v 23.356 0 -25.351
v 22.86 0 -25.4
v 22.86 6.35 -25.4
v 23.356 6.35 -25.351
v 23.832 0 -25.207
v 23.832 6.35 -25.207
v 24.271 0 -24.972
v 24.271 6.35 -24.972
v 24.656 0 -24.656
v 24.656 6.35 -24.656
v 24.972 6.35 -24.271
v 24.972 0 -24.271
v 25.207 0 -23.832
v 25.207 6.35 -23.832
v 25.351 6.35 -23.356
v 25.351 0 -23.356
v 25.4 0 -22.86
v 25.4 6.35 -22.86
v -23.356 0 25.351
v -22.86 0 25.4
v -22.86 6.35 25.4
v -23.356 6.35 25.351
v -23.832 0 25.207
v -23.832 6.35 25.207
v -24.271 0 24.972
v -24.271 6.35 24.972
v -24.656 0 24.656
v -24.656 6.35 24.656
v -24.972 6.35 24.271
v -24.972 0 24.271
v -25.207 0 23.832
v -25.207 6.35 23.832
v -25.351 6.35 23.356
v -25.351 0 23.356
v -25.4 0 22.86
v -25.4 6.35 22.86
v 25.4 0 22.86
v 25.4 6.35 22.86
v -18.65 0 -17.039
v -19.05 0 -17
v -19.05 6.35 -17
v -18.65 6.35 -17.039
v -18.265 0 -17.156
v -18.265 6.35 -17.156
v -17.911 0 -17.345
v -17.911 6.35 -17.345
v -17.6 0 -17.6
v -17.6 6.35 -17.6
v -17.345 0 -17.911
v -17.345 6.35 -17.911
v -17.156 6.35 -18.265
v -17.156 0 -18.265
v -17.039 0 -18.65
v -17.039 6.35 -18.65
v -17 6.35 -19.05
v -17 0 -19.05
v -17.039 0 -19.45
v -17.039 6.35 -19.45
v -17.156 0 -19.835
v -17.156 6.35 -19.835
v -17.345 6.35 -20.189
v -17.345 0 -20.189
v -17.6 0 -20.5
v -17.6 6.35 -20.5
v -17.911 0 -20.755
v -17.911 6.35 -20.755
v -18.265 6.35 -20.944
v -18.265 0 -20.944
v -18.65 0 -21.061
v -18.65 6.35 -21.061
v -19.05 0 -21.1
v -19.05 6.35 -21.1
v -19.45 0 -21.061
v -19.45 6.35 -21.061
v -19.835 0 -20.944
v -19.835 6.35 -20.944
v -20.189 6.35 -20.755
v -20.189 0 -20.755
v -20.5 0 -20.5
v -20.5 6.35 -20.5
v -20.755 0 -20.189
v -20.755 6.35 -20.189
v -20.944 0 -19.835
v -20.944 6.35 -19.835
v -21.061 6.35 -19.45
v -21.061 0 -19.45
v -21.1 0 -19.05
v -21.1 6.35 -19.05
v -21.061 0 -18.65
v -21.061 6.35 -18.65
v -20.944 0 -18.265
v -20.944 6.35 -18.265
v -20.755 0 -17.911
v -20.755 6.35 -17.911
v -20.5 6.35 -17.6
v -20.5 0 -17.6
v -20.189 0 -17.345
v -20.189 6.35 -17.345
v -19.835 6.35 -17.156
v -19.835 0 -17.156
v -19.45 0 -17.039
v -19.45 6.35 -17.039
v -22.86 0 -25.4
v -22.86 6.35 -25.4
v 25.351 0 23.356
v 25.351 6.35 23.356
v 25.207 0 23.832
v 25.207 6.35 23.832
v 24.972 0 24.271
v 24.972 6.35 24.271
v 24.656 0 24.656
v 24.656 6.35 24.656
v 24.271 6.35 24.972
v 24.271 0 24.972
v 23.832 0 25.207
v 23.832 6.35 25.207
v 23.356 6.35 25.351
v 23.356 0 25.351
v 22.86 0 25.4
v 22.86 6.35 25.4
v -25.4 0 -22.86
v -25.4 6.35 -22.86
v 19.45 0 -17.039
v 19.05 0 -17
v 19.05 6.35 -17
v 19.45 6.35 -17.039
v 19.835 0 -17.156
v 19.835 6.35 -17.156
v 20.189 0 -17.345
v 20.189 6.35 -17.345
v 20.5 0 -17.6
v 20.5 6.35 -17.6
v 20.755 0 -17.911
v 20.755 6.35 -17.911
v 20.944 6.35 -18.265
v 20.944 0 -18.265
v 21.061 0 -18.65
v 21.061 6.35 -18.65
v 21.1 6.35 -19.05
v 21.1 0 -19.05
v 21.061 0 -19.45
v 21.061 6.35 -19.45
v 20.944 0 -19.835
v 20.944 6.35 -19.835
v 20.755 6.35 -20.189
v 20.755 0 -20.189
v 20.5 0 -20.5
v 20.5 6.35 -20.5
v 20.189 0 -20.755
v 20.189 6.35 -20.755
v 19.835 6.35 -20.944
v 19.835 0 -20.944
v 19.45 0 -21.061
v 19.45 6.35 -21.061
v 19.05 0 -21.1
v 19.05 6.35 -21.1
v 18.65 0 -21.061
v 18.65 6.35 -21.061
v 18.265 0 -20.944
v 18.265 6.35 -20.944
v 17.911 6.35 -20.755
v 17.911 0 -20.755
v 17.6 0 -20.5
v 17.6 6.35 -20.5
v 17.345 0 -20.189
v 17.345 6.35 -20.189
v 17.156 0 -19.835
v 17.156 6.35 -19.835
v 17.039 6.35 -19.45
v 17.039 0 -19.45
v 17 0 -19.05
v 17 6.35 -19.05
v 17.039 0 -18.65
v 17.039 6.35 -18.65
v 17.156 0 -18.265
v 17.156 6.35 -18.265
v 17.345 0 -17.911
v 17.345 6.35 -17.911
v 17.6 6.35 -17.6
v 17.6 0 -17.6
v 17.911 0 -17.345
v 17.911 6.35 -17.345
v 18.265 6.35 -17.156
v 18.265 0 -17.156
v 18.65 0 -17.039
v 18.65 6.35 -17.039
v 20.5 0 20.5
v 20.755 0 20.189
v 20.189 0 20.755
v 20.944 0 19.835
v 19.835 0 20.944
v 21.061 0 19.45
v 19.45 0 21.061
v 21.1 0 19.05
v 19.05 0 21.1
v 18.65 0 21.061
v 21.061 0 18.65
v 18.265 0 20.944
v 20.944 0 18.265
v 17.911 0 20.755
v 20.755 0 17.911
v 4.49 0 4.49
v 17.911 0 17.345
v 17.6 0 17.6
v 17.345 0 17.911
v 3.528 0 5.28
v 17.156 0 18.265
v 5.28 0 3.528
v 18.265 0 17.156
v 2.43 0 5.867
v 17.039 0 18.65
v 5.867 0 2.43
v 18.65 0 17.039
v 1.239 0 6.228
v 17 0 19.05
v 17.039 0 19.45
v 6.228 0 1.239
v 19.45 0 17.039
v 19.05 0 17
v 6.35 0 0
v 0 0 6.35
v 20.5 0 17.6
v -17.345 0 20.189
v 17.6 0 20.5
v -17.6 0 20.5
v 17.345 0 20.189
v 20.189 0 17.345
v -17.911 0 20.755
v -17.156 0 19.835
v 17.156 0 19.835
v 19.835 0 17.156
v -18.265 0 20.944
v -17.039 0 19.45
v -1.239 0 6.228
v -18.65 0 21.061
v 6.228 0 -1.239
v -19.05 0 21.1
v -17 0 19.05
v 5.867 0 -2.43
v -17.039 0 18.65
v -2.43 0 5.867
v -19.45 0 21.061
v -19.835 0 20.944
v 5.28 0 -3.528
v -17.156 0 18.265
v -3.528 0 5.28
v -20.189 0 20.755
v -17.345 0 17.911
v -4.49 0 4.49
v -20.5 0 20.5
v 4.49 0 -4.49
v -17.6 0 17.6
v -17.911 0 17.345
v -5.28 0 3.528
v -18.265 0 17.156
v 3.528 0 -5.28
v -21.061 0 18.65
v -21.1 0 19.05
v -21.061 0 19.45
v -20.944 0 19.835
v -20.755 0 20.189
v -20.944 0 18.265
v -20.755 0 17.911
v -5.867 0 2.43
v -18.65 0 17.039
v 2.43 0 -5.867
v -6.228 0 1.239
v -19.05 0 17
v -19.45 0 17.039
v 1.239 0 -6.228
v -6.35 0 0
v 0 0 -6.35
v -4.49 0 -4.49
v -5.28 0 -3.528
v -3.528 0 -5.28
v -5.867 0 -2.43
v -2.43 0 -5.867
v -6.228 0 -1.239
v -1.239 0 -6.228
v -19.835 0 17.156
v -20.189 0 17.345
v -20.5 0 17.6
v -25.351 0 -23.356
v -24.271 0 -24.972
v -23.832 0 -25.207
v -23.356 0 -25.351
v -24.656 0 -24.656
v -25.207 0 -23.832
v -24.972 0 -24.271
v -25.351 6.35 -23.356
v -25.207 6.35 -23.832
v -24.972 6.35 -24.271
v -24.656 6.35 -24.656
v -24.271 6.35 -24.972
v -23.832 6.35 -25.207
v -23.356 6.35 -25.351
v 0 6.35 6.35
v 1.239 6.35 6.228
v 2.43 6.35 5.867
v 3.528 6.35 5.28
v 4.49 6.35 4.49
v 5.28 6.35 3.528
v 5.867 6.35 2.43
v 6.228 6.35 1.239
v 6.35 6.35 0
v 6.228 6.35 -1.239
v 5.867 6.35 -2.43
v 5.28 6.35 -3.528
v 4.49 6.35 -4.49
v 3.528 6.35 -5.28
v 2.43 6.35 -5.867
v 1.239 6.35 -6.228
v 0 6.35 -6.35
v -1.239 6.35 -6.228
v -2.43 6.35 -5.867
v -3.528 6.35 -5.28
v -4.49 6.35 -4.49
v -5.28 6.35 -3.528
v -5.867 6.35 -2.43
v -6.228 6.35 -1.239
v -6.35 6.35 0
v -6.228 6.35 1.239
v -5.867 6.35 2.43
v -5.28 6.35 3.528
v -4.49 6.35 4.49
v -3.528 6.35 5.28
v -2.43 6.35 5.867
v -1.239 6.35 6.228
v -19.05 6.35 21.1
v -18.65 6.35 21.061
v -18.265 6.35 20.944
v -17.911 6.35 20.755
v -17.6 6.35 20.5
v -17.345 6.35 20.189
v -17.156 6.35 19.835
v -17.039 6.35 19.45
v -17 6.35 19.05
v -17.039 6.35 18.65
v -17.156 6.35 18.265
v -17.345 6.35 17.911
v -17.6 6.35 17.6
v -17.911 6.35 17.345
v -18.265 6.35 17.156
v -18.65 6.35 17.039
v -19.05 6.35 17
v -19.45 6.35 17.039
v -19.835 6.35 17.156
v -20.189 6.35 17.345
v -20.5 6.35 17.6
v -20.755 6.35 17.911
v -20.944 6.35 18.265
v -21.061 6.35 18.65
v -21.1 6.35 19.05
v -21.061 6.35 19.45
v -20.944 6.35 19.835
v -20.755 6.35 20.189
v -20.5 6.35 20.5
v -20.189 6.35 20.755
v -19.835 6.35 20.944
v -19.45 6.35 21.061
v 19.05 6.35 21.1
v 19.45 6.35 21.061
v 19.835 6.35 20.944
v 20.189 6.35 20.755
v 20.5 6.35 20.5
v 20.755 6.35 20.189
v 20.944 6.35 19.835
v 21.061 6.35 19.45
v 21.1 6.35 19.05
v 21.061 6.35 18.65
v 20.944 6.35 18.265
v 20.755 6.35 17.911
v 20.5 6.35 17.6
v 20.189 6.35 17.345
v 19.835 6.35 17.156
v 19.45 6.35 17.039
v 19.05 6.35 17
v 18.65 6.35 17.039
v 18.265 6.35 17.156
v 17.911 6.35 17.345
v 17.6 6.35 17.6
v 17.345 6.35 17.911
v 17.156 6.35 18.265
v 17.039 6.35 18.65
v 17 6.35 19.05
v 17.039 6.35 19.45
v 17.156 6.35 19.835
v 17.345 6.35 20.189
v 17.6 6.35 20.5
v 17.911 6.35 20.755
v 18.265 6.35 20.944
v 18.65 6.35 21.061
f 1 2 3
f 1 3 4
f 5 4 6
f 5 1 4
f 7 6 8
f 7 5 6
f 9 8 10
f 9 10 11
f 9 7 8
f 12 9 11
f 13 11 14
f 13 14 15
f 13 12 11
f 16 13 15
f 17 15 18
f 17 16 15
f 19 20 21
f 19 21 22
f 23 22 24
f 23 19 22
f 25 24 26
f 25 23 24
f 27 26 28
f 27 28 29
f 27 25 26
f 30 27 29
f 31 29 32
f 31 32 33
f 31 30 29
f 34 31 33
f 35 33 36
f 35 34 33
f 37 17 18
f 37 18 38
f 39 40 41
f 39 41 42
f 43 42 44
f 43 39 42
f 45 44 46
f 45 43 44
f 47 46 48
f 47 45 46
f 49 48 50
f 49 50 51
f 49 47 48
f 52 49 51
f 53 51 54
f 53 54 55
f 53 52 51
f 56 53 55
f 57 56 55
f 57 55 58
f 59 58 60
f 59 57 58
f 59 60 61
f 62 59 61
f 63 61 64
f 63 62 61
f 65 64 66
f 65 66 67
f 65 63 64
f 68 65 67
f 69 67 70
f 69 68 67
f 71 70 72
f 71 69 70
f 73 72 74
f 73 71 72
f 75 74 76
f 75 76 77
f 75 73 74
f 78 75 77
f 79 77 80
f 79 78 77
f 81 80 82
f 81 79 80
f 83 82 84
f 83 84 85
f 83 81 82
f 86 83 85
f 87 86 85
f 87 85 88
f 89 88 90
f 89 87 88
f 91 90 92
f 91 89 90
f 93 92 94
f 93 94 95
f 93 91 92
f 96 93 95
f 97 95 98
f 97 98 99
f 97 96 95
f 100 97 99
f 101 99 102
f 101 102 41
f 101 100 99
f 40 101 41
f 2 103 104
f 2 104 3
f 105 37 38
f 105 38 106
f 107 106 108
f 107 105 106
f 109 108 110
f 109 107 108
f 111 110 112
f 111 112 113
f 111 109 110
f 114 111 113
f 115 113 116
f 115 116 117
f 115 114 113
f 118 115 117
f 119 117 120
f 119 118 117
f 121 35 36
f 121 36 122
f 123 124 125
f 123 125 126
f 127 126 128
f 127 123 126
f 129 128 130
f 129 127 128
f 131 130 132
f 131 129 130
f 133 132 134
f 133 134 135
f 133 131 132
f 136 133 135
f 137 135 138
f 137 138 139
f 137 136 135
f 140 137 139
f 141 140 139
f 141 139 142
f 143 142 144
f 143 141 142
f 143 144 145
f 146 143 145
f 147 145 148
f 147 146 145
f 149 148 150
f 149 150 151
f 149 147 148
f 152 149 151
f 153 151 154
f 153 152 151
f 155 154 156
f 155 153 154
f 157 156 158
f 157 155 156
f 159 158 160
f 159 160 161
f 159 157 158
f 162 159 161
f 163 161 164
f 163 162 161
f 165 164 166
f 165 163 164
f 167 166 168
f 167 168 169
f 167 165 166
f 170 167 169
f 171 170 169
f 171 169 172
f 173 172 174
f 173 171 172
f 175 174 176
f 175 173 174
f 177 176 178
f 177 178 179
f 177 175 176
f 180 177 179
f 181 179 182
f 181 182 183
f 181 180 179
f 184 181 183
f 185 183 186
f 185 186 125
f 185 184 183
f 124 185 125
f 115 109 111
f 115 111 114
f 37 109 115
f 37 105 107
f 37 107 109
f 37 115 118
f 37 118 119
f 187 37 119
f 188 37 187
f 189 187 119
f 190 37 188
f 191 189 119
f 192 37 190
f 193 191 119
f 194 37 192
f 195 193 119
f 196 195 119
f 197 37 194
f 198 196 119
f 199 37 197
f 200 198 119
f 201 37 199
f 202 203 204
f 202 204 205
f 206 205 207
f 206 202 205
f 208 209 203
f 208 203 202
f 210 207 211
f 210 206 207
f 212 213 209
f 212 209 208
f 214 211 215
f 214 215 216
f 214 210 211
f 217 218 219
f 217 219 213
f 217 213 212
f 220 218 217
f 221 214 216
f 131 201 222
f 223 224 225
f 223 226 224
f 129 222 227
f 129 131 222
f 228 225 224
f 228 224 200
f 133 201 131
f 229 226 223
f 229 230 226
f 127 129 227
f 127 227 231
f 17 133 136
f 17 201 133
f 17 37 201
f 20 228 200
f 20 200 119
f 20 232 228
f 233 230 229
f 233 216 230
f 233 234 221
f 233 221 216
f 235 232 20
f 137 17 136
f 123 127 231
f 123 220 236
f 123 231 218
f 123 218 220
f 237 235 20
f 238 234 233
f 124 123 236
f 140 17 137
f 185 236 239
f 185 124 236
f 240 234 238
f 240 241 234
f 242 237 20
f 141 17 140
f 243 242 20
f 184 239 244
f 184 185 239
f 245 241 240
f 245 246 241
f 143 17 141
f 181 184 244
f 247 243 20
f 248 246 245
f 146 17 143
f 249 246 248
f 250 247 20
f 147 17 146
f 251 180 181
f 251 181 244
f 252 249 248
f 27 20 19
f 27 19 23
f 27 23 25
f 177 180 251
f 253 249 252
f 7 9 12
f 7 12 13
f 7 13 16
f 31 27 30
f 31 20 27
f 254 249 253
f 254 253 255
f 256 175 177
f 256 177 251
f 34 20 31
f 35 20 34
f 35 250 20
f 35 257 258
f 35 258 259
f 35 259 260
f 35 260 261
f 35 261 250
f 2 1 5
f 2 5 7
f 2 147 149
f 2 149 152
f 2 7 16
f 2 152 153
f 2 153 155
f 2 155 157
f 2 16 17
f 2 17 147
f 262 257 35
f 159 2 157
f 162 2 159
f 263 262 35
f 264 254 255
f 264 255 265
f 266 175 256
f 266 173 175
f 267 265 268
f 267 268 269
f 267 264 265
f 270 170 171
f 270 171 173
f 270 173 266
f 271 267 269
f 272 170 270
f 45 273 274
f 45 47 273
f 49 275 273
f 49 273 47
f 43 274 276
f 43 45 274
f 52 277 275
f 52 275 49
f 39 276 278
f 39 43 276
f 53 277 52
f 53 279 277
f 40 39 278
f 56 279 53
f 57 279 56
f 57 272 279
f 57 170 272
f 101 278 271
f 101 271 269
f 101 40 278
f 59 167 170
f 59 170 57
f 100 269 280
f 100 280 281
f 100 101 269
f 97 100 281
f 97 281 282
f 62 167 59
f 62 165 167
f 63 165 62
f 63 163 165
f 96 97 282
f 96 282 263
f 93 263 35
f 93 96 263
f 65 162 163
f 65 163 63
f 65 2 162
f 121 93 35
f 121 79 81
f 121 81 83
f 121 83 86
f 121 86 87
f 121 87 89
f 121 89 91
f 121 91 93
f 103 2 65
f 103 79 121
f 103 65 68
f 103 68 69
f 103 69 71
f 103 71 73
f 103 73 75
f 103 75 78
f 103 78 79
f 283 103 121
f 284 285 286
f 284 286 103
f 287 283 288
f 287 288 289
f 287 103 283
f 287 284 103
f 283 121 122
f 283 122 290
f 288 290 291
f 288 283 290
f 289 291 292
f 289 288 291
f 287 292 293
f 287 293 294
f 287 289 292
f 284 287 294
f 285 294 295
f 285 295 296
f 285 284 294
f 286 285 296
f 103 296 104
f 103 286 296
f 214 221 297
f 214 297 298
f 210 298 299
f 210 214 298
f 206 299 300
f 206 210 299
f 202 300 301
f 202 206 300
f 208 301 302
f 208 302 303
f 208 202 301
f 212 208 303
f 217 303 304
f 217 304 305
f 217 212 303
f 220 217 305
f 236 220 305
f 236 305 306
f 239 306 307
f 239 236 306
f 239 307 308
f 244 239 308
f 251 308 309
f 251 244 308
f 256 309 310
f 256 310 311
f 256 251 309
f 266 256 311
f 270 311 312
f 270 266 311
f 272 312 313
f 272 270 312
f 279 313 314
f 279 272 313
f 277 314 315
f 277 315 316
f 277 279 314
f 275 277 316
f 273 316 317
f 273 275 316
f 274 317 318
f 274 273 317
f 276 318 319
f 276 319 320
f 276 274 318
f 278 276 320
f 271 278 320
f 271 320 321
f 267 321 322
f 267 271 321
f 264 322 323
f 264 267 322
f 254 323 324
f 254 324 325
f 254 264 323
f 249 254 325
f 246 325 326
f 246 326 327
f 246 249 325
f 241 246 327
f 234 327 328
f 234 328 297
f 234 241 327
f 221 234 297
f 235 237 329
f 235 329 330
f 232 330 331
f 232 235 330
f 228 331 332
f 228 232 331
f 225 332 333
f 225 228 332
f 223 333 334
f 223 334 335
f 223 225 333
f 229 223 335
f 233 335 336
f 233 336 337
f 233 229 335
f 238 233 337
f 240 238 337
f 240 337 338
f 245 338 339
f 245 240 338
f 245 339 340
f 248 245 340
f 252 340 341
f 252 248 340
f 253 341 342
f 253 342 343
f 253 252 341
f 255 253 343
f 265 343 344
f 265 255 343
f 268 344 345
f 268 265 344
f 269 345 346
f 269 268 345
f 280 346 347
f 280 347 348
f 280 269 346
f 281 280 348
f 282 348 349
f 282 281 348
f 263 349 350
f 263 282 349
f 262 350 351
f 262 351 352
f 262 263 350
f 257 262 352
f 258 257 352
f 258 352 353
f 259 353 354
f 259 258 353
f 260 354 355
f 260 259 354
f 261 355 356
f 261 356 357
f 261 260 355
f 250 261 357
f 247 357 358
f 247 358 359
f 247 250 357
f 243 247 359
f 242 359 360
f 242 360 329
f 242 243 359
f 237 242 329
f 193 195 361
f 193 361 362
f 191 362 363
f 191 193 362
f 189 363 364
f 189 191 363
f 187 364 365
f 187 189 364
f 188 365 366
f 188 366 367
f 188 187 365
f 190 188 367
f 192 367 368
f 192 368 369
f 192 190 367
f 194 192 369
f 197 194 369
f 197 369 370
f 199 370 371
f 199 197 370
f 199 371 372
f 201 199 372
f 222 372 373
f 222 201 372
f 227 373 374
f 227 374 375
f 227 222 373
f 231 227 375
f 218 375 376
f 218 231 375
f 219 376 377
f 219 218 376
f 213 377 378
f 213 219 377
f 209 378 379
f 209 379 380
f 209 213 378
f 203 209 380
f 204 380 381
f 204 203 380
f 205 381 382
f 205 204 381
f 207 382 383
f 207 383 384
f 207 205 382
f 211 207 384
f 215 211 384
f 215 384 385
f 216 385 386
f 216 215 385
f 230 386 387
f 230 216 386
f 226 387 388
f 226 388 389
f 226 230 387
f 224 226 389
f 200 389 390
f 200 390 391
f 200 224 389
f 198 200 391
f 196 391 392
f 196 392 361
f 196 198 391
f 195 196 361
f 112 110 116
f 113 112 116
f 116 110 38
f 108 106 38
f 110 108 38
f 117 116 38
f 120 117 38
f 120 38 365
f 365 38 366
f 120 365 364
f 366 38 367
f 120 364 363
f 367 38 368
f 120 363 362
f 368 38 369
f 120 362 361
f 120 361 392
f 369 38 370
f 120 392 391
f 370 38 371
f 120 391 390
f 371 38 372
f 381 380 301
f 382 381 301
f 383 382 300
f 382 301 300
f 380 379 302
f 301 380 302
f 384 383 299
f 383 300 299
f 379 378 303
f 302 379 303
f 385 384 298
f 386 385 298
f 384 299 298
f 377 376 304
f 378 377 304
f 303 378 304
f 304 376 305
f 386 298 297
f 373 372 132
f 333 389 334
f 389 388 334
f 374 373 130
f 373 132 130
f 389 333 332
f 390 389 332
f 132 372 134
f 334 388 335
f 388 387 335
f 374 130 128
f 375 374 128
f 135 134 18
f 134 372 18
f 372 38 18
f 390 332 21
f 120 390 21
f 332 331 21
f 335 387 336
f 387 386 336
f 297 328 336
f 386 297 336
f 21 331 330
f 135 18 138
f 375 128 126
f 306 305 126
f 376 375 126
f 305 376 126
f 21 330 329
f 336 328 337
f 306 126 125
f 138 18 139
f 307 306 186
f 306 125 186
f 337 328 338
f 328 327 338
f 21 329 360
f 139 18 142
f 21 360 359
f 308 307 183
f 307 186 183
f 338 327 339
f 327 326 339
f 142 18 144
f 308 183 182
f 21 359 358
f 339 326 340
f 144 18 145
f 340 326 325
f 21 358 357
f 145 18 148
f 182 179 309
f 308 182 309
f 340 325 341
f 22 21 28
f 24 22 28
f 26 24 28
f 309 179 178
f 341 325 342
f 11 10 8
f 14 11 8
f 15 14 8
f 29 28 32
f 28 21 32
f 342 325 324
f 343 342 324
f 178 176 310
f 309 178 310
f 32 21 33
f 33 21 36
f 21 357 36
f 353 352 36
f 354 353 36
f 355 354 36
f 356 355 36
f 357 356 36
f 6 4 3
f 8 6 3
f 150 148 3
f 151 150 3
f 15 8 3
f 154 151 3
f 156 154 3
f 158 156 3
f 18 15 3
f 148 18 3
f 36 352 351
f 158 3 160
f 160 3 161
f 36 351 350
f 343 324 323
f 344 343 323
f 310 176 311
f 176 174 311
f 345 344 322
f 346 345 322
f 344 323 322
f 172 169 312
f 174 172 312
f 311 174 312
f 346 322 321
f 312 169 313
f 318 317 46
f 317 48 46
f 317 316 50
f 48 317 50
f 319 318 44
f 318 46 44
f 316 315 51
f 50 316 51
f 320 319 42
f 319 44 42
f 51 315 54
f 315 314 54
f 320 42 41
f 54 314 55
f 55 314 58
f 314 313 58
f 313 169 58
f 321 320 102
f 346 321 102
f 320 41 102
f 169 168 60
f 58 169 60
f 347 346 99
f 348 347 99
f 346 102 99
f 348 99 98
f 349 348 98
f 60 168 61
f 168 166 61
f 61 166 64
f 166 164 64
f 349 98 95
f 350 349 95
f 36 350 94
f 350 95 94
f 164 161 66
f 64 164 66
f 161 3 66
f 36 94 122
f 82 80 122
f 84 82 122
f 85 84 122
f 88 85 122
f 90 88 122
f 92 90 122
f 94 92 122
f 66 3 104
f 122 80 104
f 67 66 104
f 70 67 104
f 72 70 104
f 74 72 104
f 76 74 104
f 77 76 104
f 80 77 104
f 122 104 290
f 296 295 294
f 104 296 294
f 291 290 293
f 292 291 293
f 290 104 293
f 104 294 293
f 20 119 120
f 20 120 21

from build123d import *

# Parameters (mm, degrees)
SKETCH2_R           = 2.05
SKETCH2_R_2         = 6.35
BOSS_EXTRUDE1_DEPTH = 6.35


with BuildPart() as part:
    # Sketch2 → Boss-Extrude1 (new body)
    with BuildSketch(Plane(origin=(0, 0, 0), x_dir=(1, 0, 0), z_dir=(0, 1, 0))):
        with BuildLine():
            ThreePointArc((-25.4, 22.86), (-24.656051224, 24.656051224), (-22.86, 25.4))
            Line((-22.86, 25.4), (22.86, 25.4))
            ThreePointArc((22.86, 25.4), (24.656051224, 24.656051224), (25.4, 22.86))
            Line((25.4, 22.86), (25.4, -22.86))
            ThreePointArc((25.4, -22.86), (24.656051224, -24.656051224), (22.86, -25.4))
            Line((22.86, -25.4), (-22.86, -25.4))
            ThreePointArc((-22.86, -25.4), (-24.656051224, -24.656051224), (-25.4, -22.86))
            Line((-25.4, -22.86), (-25.4, 22.86))
        make_face()
        with Locations(Location((-19.05, -19.05, 0), (0, 0, 270))):
            Circle(SKETCH2_R, mode=Mode.SUBTRACT)
        with Locations(Location((19.05, -19.05, 0), (0, 0, 270))):
            Circle(SKETCH2_R, mode=Mode.SUBTRACT)
        with Locations(Location((19.05, 19.05, 0), (0, 0, 270))):
            Circle(SKETCH2_R, mode=Mode.SUBTRACT)
        with Locations(Location((0, 0, 0), (0, 0, 270))):
            Circle(SKETCH2_R_2, mode=Mode.SUBTRACT)
        with Locations(Location((-19.05, 19.05, 0), (0, 0, 270))):
            Circle(SKETCH2_R, mode=Mode.SUBTRACT)
    extrude(amount=BOSS_EXTRUDE1_DEPTH)


solid = part.part
